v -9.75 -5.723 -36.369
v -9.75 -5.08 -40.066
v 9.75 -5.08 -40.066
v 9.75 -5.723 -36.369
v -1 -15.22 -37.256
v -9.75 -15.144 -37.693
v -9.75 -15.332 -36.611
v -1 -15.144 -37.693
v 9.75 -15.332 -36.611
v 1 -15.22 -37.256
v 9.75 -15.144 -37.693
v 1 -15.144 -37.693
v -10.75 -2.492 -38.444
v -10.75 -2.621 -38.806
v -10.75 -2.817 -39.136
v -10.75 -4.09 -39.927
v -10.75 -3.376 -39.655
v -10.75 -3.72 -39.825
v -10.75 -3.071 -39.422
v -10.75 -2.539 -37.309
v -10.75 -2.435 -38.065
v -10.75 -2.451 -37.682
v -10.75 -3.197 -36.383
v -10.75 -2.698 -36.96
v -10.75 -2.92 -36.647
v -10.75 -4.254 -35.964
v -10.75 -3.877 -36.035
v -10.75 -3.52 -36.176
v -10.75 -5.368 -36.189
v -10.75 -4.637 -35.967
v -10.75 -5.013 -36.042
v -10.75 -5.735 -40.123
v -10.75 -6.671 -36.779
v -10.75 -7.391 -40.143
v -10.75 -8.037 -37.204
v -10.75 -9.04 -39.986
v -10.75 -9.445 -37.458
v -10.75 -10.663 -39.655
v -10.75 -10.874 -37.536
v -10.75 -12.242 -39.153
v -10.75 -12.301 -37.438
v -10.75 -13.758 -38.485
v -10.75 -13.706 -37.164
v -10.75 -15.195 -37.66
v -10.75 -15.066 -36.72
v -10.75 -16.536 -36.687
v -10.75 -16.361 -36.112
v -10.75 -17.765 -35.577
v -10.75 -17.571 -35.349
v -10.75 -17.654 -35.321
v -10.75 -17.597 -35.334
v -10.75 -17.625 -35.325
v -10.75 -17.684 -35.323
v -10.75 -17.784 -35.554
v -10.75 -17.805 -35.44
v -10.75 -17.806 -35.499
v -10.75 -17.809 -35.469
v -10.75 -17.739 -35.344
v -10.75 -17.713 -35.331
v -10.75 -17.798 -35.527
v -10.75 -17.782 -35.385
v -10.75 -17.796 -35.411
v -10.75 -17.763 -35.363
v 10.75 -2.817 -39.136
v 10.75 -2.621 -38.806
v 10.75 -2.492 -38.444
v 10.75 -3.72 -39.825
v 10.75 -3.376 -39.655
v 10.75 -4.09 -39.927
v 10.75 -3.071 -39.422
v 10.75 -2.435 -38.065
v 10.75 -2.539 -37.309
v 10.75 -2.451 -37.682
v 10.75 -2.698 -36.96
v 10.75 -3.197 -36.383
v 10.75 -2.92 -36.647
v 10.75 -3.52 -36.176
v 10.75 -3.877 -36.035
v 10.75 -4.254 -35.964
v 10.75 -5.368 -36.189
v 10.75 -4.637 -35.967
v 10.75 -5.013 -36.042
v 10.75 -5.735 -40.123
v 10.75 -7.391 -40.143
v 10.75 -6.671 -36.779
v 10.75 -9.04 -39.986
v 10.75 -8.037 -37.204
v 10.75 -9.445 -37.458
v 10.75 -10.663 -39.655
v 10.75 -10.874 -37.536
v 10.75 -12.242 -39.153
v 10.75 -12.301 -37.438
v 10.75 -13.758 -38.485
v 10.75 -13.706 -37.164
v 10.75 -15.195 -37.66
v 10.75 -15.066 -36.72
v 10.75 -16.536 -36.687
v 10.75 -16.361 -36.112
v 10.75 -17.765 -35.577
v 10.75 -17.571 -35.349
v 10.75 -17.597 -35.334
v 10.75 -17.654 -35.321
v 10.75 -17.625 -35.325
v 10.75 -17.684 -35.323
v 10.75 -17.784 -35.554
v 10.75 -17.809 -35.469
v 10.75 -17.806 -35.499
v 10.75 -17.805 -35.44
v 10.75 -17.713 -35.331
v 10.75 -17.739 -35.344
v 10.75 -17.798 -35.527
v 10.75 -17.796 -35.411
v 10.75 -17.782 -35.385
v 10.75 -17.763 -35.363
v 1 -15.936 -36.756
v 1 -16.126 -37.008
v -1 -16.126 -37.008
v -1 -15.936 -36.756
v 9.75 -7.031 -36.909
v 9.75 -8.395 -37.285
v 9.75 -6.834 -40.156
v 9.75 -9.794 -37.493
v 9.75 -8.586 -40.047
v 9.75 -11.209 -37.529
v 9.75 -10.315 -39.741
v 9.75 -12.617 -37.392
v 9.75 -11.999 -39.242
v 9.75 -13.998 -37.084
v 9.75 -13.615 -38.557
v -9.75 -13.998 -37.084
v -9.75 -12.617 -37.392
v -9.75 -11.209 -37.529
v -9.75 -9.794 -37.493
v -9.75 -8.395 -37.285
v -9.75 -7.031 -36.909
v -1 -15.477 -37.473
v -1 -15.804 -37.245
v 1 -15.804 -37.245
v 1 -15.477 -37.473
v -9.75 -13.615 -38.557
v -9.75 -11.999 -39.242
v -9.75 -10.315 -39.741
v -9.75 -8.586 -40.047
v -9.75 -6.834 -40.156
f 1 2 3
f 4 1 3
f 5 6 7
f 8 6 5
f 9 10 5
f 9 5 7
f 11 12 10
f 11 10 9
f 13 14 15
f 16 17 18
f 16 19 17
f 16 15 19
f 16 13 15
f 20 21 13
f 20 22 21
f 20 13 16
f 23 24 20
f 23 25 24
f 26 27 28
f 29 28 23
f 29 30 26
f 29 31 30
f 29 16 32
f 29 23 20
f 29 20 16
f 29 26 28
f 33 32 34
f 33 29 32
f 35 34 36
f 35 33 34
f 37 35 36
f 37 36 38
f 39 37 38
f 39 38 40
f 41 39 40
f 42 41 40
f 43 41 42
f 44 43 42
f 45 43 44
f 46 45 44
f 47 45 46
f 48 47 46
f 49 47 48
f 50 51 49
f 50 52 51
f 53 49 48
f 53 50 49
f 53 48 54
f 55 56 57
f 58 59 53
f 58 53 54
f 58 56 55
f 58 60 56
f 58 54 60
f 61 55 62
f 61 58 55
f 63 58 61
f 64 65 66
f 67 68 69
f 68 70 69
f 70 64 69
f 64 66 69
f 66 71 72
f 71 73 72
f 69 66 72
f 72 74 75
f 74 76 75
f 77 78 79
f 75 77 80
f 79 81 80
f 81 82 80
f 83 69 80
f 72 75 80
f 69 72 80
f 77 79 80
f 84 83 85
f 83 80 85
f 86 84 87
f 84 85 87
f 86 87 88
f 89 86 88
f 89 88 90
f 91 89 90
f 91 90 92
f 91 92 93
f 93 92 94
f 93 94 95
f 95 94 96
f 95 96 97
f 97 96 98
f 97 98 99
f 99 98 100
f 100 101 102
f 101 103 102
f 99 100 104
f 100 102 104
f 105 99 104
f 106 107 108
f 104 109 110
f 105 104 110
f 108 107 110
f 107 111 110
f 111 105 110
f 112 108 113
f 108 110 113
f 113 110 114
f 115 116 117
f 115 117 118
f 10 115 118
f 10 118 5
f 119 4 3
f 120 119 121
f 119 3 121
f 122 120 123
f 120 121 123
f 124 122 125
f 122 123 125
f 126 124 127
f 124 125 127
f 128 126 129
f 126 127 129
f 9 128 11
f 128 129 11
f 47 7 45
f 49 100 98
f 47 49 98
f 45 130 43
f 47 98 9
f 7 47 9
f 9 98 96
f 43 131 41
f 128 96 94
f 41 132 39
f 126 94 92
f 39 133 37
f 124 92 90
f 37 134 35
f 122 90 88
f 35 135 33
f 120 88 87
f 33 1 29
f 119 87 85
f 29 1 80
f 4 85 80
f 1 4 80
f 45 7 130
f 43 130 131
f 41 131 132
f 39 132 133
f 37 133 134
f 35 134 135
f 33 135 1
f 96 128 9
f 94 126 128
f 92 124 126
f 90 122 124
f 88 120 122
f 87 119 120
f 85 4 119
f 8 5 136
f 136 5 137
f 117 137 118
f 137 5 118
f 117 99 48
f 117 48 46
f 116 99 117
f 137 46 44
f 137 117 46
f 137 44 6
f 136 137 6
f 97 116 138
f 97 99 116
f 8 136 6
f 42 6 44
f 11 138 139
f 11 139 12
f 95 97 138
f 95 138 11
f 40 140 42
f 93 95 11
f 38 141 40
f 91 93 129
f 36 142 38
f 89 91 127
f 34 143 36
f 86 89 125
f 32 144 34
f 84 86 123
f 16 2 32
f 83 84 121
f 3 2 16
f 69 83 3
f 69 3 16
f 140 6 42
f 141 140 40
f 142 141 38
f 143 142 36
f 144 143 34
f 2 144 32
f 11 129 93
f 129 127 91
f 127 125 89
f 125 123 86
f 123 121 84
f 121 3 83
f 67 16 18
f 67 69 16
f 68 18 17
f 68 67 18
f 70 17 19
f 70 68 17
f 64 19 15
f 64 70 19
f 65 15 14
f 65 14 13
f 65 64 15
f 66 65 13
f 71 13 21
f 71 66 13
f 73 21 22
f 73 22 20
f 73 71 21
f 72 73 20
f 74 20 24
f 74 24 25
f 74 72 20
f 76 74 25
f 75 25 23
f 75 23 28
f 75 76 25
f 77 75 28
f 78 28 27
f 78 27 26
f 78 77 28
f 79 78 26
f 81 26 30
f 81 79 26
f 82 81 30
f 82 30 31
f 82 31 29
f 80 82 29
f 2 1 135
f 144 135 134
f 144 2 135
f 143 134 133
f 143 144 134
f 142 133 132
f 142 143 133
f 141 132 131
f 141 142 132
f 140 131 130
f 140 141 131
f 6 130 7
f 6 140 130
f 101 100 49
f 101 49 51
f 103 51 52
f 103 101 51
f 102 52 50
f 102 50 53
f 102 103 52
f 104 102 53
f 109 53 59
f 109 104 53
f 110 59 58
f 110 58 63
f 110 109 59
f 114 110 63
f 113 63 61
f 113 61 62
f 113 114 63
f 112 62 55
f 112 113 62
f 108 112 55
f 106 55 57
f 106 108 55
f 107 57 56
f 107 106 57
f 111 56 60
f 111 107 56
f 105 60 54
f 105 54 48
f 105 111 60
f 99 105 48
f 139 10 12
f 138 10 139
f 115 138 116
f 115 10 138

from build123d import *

# Parameters (mm, degrees)
PAD008_DEPTH    = 10.75
SKETCH049_W     = 19.5
SKETCH049_H     = 9.508905554
POCKET006_DEPTH = 6.8868250221
POCKET007_DEPTH = 1


with BuildPart() as part:
    # Sketch048 → Pad008 (new body, symmetric)
    with BuildSketch(Plane.YZ):
        with BuildLine():
            ThreePointArc((-17.570923429, -35.349067746), (-11.5889977168, -37.5087777423), (-5.3676713633, -36.1885955969))
            ThreePointArc((-4.0896315326, -39.9266740125), (-2.5394656722, -37.309157564), (-5.3676713633, -36.1885955969))
            ThreePointArc((-17.7649340088, -35.5765725595), (-11.4595142974, -39.4247858993), (-4.0896315326, -39.9266740125))
            ThreePointArc((-17.570923429, -35.349067746), (-17.7727328087, -35.3734457702), (-17.7649340088, -35.5765725595))
        make_face()
    extrude(amount=PAD008_DEPTH, both=True)

    # Sketch049 (on DatumPlane) → Pocket006 (cut, through all)
    with BuildSketch(Plane(origin=(10.75, -4.0896315326, -39.9266740125), x_dir=(1, 0, 0), z_dir=(0, 0.1711412337, -0.9852465063))):
        with Locations((-10.75, 5.754452777)):
            Rectangle(SKETCH049_W, SKETCH049_H)
    extrude(amount=-POCKET006_DEPTH, mode=Mode.SUBTRACT)

    # Sketch050 → Pocket007 (cut, symmetric)
    with BuildSketch(Plane.YZ):
        Polygon((-16.49066, -37.494777), (-15.936452, -36.755833), (-13.493837, -38.459507), (-14.520146, -39.301079), align=None)
    extrude(amount=POCKET007_DEPTH, both=True, mode=Mode.SUBTRACT)


solid = part.part
